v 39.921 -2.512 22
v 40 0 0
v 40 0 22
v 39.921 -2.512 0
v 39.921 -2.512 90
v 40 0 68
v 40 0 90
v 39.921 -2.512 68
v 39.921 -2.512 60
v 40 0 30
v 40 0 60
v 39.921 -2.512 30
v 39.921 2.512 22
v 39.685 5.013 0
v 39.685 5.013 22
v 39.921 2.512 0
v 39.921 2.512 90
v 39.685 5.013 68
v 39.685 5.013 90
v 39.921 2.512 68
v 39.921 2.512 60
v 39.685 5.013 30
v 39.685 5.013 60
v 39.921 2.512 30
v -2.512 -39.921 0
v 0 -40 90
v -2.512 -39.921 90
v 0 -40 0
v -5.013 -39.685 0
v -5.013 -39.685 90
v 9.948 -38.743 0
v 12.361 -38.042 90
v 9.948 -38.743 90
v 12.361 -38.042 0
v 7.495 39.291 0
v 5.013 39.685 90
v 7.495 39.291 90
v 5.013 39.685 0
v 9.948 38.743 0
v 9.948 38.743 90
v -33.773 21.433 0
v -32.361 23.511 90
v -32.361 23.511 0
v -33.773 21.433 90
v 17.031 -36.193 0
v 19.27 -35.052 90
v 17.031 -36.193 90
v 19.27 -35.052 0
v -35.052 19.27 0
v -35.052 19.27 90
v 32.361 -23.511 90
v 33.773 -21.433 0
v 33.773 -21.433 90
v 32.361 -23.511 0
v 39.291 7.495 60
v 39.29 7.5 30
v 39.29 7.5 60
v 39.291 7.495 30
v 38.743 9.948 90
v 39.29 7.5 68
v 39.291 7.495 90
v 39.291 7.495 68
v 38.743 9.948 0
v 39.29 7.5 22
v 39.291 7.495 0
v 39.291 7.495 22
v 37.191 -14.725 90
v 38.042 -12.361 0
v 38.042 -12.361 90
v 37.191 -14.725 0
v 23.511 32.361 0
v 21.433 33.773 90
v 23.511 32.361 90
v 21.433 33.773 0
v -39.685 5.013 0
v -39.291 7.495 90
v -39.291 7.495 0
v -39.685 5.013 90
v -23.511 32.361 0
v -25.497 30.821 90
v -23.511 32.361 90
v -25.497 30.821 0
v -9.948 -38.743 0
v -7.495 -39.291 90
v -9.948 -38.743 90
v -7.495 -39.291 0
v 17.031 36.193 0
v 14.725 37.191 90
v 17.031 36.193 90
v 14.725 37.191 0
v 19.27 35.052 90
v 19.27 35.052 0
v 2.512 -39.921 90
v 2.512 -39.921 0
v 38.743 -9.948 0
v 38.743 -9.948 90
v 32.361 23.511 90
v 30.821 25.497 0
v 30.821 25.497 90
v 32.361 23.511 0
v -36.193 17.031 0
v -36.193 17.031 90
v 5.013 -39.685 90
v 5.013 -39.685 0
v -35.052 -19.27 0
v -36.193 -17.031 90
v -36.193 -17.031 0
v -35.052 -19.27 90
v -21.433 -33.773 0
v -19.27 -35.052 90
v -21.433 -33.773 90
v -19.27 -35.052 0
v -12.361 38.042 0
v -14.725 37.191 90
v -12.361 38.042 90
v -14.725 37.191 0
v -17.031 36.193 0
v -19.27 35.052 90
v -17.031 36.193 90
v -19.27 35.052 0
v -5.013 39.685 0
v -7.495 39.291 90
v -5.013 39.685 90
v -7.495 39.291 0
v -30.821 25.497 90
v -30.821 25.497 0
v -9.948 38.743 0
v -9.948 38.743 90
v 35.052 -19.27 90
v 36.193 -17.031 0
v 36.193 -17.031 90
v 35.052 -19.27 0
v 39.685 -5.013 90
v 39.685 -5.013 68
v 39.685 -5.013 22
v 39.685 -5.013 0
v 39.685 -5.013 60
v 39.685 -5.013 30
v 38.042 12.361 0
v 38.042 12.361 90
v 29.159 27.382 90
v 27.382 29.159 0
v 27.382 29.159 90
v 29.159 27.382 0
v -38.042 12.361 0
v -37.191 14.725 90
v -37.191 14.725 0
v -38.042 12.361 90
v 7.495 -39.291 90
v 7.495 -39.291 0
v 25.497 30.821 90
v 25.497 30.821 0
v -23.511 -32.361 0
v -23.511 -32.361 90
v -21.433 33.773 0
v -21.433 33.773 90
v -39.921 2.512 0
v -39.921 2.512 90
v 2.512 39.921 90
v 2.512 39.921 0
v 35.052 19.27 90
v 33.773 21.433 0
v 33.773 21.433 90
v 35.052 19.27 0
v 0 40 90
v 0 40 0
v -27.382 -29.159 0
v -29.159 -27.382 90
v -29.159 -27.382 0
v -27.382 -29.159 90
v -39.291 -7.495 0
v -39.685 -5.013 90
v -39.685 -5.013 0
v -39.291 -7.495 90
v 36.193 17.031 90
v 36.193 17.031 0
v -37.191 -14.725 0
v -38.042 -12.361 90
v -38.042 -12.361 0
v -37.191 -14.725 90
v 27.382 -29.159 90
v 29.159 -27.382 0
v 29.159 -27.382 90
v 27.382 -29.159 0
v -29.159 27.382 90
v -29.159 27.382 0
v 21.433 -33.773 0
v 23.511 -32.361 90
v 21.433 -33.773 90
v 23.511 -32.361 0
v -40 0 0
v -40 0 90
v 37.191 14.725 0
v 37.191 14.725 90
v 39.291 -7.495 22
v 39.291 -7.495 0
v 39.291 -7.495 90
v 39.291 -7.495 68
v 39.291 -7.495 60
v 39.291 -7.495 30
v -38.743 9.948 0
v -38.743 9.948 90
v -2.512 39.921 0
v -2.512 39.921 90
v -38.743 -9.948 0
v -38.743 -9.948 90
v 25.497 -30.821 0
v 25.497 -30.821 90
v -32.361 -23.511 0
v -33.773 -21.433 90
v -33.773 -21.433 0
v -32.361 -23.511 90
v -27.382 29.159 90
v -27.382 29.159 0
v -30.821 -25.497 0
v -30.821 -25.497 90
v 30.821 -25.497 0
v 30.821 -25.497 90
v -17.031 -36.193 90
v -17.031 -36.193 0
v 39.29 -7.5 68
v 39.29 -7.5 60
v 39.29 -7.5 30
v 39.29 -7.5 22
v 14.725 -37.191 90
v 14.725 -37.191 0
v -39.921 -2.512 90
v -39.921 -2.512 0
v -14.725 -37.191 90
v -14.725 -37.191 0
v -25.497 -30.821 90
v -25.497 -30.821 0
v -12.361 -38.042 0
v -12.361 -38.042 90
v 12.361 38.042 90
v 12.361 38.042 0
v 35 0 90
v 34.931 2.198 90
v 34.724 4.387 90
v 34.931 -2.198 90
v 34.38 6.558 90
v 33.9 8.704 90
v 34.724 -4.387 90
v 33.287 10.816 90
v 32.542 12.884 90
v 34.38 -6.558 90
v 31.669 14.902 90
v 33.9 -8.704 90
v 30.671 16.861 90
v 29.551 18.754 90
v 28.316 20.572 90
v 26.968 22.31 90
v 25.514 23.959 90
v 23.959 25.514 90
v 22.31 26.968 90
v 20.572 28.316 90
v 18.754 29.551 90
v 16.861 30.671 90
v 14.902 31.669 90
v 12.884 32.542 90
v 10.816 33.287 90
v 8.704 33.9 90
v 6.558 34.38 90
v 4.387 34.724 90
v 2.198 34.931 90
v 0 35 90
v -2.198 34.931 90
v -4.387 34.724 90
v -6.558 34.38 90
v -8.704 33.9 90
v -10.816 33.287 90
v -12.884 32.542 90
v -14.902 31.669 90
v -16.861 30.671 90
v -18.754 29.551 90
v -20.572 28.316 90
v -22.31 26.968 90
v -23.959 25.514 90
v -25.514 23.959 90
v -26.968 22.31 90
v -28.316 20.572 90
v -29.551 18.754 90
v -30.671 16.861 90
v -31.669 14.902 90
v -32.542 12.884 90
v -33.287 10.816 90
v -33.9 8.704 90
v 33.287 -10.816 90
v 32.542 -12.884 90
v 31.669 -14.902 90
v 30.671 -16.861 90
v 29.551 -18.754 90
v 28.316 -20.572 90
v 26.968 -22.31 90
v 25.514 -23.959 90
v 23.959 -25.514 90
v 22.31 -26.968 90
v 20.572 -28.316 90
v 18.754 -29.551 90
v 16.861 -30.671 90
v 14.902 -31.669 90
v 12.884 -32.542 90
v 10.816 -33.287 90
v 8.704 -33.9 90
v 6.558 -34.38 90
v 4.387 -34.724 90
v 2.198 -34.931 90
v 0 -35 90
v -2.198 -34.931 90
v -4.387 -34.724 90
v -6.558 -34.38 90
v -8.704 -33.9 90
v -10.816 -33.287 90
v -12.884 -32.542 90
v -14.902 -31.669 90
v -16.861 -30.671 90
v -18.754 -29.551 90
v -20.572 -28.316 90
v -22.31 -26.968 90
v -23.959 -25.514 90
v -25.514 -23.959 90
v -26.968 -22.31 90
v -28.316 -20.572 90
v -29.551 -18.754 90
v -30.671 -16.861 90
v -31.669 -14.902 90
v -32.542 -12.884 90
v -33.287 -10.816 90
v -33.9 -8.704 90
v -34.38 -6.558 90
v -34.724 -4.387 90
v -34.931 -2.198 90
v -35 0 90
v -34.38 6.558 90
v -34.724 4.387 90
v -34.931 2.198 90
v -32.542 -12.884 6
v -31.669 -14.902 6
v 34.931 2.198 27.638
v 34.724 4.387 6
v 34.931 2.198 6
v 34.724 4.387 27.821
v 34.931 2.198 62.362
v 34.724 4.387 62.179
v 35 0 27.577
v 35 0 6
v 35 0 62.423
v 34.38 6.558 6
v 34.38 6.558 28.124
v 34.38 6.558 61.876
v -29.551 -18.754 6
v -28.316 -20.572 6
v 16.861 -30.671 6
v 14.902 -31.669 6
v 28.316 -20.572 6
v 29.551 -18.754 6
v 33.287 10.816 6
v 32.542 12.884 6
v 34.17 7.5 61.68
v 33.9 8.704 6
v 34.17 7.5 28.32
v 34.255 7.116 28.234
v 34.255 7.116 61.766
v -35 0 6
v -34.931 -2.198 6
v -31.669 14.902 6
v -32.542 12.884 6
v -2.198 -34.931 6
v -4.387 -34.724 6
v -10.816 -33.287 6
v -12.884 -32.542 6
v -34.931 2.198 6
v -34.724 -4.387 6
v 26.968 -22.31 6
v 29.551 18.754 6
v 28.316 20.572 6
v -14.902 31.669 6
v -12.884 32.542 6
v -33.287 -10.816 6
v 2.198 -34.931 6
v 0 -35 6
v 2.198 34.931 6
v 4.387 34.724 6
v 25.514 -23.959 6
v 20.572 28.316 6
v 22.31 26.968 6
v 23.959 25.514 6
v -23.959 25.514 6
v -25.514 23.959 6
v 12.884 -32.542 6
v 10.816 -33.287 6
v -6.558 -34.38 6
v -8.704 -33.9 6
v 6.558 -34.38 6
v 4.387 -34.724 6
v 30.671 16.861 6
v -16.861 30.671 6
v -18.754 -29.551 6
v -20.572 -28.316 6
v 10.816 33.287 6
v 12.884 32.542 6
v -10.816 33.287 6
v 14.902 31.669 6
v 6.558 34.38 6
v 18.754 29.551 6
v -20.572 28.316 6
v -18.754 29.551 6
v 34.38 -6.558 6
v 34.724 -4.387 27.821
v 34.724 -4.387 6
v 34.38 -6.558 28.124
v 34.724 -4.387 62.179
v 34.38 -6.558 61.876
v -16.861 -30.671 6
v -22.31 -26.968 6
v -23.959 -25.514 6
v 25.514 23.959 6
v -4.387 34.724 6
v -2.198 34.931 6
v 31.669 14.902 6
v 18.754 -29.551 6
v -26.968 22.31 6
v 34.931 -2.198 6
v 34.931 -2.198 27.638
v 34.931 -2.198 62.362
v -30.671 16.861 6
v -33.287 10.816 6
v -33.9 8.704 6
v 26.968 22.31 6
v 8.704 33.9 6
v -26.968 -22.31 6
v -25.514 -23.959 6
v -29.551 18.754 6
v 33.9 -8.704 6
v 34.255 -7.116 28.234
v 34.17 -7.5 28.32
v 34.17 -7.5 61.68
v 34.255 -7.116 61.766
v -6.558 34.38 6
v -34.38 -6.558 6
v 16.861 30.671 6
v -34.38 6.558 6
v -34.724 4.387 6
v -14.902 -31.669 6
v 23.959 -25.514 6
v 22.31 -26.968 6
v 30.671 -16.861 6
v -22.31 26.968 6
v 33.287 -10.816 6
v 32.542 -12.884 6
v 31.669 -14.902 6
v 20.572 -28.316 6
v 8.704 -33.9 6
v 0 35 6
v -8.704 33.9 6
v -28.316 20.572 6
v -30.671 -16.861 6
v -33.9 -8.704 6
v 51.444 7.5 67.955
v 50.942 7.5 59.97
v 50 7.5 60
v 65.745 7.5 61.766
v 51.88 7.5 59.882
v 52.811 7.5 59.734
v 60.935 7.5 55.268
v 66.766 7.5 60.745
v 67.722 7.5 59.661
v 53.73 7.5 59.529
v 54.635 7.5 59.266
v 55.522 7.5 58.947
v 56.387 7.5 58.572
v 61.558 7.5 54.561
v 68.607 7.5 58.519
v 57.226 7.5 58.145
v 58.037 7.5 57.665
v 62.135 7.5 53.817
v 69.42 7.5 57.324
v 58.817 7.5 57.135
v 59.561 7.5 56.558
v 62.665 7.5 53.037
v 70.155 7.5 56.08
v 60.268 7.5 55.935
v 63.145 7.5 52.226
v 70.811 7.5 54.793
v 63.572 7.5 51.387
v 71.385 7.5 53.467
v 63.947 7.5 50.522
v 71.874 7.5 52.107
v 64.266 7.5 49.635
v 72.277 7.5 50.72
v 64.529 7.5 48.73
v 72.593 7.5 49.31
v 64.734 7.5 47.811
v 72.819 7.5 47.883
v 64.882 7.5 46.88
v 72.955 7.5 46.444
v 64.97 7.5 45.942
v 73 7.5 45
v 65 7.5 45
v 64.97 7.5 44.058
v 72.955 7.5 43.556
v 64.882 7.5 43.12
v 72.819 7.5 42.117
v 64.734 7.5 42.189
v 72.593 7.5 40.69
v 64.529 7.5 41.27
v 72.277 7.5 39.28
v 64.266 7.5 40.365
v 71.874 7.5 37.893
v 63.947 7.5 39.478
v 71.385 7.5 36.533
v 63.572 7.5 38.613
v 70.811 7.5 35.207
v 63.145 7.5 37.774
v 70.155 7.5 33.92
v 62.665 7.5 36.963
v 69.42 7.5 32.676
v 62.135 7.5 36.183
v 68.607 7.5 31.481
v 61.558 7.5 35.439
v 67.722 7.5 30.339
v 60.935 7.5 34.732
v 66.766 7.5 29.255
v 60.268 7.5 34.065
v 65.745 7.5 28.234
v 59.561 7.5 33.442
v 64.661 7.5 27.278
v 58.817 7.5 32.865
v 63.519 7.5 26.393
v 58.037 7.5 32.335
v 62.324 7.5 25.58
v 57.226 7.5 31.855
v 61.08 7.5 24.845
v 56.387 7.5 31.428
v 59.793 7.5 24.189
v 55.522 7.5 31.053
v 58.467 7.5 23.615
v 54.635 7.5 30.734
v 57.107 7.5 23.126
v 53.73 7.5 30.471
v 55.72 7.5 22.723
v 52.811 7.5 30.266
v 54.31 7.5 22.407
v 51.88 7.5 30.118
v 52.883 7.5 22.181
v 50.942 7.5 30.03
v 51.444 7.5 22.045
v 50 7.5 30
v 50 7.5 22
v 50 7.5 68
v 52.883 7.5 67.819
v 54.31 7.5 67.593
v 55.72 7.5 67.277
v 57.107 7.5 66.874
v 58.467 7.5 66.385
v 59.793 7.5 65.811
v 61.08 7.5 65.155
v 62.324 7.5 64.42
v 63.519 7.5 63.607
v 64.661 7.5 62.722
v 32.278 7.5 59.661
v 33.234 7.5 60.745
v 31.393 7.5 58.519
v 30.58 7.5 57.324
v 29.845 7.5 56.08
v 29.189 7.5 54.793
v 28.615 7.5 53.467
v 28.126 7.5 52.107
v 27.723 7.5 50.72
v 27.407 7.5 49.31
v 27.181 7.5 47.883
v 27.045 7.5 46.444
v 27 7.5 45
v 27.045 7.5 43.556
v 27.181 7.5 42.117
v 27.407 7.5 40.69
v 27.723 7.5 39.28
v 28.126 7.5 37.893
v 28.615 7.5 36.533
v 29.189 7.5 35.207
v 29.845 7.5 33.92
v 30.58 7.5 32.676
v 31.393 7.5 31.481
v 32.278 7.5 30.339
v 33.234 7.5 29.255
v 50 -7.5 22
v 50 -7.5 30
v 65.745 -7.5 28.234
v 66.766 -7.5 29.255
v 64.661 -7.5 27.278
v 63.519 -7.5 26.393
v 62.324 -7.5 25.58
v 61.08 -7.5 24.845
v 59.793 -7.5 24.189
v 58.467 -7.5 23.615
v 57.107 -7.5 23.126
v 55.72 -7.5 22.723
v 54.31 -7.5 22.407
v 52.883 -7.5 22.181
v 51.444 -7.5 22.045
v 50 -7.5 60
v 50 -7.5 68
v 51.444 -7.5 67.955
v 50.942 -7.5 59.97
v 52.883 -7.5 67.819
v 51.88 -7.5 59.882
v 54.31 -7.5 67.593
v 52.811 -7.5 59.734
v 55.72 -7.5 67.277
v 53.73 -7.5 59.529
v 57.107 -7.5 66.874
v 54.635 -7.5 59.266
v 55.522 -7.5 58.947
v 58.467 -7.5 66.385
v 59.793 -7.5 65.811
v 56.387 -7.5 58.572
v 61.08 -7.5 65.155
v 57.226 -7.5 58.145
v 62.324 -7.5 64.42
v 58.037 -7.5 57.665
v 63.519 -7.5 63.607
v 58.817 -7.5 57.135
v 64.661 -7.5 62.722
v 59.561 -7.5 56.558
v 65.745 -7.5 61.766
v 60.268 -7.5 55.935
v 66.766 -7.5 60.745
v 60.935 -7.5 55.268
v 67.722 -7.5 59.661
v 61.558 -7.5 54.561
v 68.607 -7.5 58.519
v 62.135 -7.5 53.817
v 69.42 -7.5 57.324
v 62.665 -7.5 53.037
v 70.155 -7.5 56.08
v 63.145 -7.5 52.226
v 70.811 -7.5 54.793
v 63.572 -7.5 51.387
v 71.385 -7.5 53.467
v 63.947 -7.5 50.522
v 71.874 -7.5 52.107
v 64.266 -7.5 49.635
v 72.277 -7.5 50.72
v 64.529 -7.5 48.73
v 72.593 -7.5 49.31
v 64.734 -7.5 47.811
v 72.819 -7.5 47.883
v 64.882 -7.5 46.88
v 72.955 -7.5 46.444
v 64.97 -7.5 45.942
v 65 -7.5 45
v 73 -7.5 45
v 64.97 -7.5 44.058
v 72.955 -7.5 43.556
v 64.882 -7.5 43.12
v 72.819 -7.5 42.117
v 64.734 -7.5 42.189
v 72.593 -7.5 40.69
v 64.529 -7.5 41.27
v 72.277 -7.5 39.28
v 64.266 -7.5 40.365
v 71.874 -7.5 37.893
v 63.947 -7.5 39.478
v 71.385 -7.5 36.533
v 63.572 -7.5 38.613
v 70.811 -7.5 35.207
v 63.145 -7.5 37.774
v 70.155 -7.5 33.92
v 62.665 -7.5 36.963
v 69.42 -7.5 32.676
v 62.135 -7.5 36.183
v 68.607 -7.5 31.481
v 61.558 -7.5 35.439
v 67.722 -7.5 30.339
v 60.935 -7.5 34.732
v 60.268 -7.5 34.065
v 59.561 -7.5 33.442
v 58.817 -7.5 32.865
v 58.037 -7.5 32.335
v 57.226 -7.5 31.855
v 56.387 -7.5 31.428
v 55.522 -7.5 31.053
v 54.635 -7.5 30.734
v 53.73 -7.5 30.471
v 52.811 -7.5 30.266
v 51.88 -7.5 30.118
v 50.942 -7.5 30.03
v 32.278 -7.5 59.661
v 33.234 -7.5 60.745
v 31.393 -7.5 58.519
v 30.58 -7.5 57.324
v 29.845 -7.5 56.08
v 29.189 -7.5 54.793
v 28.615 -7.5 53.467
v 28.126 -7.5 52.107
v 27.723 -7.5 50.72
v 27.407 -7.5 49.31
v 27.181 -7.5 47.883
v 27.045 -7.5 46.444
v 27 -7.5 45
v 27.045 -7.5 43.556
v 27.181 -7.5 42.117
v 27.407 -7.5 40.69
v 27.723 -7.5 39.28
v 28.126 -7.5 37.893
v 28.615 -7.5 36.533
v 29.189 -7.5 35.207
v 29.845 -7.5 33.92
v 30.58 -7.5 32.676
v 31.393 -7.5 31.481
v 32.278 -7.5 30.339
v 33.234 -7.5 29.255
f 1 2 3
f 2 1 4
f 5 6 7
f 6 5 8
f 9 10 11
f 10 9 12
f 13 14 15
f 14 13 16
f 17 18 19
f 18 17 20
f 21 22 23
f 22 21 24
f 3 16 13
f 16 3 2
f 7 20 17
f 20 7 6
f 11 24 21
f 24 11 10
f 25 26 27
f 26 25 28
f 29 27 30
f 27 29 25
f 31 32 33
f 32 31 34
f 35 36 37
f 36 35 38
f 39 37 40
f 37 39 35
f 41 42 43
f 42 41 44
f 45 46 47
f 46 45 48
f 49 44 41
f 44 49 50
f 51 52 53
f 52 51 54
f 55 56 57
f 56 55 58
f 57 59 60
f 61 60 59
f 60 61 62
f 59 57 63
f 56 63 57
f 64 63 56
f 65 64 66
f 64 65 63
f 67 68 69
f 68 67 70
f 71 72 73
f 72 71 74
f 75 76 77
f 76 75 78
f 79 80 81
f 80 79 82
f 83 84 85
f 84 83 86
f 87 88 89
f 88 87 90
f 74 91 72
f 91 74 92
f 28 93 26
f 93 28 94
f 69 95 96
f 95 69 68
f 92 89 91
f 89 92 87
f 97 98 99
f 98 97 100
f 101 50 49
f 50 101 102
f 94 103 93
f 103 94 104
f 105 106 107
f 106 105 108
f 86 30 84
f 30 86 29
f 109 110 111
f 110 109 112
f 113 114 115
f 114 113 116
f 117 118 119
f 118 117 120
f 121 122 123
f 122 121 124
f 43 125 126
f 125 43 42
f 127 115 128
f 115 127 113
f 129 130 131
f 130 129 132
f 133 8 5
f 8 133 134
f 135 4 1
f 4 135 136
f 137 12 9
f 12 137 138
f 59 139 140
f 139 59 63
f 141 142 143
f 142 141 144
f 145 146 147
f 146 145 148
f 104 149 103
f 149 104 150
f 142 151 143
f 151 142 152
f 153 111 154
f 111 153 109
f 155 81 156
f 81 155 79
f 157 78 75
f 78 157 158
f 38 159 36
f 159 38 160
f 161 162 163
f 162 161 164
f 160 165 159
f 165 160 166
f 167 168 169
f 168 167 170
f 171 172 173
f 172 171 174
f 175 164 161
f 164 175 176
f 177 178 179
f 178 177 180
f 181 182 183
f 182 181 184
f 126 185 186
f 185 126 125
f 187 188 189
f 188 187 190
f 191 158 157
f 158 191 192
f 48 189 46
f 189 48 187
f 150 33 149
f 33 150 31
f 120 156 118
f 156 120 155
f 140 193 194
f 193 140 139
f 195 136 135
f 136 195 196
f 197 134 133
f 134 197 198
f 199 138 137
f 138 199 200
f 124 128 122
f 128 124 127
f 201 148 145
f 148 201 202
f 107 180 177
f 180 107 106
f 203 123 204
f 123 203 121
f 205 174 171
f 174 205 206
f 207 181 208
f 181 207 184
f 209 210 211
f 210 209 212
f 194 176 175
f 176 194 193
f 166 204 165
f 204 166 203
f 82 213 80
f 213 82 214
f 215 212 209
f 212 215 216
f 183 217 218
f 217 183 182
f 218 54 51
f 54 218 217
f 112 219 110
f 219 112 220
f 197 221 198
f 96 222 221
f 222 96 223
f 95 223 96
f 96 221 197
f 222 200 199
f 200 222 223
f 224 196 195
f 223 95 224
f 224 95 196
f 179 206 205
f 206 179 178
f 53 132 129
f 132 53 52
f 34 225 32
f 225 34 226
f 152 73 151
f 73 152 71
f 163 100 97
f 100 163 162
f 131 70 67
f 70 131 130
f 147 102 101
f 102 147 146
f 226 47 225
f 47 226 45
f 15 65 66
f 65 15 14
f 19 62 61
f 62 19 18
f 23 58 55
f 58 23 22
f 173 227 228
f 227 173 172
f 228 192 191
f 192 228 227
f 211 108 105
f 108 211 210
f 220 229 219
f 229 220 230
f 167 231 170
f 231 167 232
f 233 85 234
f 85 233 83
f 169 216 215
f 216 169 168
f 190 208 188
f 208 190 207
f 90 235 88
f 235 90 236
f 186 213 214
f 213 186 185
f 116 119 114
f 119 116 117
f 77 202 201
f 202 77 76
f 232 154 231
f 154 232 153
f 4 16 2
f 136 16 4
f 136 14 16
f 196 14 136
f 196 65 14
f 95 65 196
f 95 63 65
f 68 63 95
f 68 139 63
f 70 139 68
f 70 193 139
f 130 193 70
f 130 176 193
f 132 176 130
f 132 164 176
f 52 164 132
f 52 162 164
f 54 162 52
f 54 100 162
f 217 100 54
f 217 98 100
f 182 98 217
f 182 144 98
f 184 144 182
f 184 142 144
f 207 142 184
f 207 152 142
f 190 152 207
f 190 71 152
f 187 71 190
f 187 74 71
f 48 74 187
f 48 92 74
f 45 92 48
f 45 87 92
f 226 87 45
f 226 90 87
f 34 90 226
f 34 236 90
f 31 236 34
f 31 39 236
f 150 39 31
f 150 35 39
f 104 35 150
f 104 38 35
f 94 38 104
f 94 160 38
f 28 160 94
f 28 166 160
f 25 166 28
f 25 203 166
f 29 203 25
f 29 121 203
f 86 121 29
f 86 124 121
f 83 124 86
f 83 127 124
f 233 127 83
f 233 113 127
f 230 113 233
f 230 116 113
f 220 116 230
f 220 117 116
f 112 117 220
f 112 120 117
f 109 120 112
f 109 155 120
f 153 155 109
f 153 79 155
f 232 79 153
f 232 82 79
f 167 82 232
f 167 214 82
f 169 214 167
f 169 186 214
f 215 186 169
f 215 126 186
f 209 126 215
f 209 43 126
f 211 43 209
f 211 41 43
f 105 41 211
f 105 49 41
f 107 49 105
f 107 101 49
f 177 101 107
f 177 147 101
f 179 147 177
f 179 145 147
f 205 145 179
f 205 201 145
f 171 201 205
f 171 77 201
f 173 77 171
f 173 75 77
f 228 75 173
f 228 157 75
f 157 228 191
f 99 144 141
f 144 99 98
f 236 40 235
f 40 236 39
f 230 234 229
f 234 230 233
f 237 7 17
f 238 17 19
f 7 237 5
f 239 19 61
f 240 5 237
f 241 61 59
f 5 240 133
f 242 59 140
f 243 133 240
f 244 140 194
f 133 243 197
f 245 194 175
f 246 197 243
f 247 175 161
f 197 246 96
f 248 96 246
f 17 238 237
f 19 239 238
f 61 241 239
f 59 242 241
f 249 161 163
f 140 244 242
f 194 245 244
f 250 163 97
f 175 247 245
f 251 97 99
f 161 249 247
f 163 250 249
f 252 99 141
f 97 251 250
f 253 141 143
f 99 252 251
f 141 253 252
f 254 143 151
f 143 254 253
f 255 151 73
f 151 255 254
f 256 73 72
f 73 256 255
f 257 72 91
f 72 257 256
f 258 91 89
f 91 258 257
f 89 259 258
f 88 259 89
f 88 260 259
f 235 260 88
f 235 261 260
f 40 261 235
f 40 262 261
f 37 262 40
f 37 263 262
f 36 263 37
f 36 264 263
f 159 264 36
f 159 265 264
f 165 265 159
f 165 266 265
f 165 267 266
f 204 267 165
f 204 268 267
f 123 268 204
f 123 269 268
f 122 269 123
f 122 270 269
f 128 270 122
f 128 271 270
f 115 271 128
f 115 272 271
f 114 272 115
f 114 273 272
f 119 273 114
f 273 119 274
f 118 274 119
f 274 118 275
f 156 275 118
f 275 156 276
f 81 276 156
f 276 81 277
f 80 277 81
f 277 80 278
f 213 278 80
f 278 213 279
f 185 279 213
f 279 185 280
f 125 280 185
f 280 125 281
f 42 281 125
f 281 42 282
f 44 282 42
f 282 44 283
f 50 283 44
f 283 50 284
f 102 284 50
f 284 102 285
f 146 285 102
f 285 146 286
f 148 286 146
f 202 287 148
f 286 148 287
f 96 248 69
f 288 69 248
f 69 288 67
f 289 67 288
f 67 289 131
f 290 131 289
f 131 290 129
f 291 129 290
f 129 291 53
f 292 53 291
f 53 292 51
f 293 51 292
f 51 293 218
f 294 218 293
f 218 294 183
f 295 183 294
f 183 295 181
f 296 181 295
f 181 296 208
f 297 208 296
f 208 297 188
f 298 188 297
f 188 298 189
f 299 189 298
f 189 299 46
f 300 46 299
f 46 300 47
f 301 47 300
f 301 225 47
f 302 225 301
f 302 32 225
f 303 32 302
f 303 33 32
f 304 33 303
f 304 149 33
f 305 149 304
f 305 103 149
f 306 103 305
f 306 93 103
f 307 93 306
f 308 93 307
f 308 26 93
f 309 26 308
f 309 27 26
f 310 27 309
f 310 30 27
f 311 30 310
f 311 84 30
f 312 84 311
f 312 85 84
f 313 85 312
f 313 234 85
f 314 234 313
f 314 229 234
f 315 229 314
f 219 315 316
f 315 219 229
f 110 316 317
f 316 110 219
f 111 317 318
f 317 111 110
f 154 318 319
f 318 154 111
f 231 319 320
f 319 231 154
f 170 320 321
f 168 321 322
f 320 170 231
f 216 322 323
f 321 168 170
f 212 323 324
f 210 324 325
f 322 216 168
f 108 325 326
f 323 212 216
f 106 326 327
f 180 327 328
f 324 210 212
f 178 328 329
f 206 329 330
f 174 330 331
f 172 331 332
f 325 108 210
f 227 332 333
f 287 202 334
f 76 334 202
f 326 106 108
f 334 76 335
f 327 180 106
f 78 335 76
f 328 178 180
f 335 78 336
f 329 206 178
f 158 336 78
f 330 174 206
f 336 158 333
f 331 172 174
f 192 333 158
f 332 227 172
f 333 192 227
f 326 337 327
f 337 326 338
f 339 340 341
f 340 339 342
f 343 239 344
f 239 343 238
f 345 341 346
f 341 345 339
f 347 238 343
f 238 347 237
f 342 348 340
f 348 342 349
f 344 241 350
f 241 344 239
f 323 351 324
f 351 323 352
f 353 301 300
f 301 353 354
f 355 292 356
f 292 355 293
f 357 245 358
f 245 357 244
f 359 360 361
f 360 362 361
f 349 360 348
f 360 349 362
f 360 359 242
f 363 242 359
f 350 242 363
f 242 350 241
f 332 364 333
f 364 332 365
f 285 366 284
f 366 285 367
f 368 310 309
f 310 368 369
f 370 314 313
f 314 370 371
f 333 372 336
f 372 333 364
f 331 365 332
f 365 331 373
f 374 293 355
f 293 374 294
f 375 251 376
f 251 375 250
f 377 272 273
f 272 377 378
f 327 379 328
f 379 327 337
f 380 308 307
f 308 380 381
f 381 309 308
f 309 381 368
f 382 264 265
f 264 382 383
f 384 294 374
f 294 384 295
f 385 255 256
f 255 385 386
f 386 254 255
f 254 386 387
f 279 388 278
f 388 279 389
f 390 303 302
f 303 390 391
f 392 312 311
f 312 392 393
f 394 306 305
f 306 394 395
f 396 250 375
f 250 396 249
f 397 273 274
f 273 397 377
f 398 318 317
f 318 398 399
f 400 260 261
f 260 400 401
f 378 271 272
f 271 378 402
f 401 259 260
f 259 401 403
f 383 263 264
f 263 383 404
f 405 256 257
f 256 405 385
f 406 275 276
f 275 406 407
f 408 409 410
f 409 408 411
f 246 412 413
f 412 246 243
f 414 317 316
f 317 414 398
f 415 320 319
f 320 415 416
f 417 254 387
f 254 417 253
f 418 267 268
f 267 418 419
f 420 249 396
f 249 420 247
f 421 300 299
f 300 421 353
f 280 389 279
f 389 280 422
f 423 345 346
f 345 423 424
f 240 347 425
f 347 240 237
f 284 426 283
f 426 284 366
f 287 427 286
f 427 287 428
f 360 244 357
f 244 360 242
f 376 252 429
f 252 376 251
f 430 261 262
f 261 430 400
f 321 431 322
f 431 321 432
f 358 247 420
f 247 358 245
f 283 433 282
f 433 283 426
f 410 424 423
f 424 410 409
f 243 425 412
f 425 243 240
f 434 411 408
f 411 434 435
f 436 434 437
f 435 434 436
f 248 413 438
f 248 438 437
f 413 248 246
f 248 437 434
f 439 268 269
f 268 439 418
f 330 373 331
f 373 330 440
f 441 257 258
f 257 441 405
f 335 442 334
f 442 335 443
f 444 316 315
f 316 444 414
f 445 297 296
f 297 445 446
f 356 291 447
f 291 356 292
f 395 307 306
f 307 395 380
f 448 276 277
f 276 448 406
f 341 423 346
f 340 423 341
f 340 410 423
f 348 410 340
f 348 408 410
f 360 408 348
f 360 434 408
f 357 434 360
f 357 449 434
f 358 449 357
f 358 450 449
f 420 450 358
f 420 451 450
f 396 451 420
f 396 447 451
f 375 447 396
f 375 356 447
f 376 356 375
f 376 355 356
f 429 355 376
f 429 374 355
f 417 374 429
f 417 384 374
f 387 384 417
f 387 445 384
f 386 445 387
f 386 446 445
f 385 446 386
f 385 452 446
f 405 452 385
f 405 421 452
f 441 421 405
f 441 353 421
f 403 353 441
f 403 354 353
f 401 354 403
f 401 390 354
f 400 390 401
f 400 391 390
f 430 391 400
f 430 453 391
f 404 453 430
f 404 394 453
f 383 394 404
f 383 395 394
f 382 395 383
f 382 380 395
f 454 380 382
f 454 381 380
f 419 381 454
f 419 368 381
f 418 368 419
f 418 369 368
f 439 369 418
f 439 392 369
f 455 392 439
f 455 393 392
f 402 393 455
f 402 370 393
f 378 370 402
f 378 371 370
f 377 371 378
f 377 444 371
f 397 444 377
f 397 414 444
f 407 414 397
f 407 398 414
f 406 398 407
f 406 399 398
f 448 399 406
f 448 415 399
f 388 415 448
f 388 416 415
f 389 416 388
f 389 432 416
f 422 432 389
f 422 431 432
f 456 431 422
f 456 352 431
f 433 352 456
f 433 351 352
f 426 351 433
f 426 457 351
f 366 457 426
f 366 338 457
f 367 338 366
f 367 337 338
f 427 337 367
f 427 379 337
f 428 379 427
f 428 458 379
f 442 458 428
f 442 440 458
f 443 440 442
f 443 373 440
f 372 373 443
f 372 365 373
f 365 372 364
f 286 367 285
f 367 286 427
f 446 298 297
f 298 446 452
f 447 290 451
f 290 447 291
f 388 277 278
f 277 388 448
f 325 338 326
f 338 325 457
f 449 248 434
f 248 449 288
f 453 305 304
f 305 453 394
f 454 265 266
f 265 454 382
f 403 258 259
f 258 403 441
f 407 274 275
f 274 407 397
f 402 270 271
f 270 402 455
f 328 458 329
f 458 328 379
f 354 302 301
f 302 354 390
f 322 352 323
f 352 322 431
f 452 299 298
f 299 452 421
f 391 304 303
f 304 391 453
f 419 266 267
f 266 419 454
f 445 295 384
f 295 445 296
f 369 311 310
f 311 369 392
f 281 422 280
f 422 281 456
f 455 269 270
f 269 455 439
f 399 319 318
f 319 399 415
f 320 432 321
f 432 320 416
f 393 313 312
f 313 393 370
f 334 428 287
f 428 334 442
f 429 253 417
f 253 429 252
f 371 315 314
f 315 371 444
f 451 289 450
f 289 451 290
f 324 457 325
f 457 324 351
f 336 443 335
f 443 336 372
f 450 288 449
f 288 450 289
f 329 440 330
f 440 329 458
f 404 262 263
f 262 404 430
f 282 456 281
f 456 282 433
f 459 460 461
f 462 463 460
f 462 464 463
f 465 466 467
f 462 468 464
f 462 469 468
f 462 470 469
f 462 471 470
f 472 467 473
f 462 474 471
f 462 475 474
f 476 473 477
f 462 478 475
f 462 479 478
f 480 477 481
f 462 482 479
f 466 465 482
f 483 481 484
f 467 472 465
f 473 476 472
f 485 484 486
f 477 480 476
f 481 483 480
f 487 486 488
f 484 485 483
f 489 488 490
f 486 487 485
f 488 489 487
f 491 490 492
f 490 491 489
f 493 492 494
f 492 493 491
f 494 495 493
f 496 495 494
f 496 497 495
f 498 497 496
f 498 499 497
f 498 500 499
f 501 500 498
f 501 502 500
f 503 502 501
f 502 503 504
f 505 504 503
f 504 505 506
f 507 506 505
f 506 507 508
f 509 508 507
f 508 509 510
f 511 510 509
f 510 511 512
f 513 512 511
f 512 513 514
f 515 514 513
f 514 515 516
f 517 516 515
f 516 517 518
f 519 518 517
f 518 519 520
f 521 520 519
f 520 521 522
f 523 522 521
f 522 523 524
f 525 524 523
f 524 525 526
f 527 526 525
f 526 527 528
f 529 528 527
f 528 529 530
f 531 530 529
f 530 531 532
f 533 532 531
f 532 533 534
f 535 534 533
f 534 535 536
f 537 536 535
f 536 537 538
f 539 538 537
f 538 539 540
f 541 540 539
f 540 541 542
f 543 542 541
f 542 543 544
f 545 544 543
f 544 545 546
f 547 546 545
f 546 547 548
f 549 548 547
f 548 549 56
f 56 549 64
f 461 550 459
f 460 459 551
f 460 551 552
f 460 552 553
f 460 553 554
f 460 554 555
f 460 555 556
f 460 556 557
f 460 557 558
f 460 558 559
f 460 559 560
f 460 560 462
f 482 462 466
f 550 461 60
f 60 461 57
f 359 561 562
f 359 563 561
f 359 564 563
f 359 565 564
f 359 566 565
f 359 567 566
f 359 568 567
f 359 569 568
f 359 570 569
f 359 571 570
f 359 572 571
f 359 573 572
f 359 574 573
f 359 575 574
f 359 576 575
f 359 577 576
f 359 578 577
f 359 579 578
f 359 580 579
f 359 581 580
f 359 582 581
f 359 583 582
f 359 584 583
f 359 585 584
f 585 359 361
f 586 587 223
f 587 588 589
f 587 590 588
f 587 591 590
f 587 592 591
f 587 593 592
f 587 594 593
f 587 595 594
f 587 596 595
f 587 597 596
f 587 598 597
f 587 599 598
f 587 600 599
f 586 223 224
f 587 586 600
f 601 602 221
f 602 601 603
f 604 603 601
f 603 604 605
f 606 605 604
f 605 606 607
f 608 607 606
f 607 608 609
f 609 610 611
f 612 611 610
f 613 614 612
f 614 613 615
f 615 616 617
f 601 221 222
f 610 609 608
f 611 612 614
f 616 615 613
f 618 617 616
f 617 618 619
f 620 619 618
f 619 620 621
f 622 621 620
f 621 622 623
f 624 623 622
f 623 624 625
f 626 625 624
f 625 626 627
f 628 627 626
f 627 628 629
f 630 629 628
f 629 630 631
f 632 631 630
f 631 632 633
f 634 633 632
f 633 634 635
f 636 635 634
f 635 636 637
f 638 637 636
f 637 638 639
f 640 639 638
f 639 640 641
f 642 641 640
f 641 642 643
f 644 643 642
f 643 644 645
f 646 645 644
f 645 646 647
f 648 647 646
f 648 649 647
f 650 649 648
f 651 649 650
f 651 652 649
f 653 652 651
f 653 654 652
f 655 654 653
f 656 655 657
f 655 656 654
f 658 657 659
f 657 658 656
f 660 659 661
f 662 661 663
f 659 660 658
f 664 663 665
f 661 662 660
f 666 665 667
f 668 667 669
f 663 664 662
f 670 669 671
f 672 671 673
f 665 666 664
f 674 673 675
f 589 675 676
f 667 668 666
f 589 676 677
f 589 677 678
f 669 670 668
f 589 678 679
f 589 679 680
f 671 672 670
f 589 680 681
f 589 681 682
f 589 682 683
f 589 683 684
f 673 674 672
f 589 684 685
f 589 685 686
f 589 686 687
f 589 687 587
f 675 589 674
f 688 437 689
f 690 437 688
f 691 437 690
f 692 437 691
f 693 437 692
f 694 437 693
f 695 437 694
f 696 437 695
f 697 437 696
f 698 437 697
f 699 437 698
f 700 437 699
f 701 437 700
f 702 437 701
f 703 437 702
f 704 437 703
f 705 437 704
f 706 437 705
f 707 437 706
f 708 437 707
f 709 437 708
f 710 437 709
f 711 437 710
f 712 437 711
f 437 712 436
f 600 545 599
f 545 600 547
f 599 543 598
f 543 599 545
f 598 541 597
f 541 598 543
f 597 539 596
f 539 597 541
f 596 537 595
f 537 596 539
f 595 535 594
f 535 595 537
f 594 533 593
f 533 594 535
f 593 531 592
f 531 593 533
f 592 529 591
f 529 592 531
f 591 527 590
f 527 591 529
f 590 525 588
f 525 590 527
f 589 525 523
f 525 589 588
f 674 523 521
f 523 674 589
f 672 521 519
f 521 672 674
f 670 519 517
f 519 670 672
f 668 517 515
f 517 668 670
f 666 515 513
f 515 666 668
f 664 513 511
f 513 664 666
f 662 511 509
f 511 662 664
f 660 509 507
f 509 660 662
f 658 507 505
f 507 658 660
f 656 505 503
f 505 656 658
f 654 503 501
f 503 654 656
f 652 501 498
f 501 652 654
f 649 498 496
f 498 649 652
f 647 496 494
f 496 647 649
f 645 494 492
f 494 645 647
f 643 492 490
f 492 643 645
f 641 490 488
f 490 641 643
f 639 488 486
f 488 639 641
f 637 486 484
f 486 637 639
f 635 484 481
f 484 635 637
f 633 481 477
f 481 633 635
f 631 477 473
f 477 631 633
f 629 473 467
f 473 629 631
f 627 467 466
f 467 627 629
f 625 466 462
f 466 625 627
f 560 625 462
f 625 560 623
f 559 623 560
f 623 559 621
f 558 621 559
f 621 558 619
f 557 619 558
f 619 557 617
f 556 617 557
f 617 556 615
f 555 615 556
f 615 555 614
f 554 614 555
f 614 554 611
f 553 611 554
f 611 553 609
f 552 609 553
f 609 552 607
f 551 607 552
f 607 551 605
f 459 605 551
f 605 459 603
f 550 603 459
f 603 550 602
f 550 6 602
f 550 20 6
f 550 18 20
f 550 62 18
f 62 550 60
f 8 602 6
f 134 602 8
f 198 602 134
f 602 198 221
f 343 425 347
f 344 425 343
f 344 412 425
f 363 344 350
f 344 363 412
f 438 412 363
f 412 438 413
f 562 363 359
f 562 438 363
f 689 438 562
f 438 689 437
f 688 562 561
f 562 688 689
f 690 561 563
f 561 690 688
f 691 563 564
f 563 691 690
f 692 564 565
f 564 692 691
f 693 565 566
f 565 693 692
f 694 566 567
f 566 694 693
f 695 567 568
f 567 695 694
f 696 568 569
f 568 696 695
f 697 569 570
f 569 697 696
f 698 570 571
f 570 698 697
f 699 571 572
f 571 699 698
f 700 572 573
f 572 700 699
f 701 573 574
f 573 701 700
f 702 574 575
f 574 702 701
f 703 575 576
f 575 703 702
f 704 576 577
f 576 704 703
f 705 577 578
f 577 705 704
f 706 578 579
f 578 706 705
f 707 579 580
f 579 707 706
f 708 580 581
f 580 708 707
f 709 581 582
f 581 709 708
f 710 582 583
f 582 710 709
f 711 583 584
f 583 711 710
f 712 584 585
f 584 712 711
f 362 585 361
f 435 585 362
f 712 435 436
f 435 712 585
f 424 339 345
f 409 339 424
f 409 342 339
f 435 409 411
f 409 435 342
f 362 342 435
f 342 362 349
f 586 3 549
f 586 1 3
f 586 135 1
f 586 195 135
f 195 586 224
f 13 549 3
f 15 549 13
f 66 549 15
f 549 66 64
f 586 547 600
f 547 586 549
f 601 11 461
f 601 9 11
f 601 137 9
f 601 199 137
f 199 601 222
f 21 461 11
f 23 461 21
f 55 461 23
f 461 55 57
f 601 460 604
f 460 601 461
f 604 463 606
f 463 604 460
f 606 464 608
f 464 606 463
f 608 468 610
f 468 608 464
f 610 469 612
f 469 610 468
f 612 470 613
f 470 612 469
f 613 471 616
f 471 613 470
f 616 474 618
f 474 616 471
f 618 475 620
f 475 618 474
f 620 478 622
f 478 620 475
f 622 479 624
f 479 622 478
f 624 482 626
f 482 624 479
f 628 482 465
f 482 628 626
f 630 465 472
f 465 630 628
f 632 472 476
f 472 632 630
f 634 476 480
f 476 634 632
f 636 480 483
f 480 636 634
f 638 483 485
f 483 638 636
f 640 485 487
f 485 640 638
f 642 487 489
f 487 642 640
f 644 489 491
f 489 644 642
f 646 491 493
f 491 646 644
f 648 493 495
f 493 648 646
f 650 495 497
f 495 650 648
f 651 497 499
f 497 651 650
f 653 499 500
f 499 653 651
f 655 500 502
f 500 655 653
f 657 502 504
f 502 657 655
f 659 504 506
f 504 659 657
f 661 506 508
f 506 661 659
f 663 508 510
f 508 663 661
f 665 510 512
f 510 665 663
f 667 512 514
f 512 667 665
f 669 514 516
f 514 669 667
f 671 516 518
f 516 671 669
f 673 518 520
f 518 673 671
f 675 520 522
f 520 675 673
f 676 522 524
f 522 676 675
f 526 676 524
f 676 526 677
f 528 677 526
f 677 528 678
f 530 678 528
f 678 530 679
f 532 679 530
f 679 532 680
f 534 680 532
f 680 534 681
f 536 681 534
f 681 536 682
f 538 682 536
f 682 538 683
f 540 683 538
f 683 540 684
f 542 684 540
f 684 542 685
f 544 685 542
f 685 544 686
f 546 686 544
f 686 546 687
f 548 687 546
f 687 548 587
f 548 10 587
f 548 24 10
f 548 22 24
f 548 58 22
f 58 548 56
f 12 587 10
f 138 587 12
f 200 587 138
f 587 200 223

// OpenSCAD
$fn = 100;

union() {
    // 本体
    difference() {
        cylinder(h = 90, r = 40);
        translate([0, 0, 6])
            cylinder(h = 90, r = 35);
    }
    
    // 取手
    translate([40, 0, 45])
    rotate([90, 0, 0])
    linear_extrude(height = 15, center = true) {
        difference() {
            // 取手の外側
            union() {
                translate([-3, -23]) square([13, 46]);
                translate([10, 0]) circle(r = 23);
            }
            // 取手の内側の空間
            union() {
                translate([-4, -15]) square([14, 30]);
                translate([10, 0]) circle(r = 15);
            }
        }
    }
}
